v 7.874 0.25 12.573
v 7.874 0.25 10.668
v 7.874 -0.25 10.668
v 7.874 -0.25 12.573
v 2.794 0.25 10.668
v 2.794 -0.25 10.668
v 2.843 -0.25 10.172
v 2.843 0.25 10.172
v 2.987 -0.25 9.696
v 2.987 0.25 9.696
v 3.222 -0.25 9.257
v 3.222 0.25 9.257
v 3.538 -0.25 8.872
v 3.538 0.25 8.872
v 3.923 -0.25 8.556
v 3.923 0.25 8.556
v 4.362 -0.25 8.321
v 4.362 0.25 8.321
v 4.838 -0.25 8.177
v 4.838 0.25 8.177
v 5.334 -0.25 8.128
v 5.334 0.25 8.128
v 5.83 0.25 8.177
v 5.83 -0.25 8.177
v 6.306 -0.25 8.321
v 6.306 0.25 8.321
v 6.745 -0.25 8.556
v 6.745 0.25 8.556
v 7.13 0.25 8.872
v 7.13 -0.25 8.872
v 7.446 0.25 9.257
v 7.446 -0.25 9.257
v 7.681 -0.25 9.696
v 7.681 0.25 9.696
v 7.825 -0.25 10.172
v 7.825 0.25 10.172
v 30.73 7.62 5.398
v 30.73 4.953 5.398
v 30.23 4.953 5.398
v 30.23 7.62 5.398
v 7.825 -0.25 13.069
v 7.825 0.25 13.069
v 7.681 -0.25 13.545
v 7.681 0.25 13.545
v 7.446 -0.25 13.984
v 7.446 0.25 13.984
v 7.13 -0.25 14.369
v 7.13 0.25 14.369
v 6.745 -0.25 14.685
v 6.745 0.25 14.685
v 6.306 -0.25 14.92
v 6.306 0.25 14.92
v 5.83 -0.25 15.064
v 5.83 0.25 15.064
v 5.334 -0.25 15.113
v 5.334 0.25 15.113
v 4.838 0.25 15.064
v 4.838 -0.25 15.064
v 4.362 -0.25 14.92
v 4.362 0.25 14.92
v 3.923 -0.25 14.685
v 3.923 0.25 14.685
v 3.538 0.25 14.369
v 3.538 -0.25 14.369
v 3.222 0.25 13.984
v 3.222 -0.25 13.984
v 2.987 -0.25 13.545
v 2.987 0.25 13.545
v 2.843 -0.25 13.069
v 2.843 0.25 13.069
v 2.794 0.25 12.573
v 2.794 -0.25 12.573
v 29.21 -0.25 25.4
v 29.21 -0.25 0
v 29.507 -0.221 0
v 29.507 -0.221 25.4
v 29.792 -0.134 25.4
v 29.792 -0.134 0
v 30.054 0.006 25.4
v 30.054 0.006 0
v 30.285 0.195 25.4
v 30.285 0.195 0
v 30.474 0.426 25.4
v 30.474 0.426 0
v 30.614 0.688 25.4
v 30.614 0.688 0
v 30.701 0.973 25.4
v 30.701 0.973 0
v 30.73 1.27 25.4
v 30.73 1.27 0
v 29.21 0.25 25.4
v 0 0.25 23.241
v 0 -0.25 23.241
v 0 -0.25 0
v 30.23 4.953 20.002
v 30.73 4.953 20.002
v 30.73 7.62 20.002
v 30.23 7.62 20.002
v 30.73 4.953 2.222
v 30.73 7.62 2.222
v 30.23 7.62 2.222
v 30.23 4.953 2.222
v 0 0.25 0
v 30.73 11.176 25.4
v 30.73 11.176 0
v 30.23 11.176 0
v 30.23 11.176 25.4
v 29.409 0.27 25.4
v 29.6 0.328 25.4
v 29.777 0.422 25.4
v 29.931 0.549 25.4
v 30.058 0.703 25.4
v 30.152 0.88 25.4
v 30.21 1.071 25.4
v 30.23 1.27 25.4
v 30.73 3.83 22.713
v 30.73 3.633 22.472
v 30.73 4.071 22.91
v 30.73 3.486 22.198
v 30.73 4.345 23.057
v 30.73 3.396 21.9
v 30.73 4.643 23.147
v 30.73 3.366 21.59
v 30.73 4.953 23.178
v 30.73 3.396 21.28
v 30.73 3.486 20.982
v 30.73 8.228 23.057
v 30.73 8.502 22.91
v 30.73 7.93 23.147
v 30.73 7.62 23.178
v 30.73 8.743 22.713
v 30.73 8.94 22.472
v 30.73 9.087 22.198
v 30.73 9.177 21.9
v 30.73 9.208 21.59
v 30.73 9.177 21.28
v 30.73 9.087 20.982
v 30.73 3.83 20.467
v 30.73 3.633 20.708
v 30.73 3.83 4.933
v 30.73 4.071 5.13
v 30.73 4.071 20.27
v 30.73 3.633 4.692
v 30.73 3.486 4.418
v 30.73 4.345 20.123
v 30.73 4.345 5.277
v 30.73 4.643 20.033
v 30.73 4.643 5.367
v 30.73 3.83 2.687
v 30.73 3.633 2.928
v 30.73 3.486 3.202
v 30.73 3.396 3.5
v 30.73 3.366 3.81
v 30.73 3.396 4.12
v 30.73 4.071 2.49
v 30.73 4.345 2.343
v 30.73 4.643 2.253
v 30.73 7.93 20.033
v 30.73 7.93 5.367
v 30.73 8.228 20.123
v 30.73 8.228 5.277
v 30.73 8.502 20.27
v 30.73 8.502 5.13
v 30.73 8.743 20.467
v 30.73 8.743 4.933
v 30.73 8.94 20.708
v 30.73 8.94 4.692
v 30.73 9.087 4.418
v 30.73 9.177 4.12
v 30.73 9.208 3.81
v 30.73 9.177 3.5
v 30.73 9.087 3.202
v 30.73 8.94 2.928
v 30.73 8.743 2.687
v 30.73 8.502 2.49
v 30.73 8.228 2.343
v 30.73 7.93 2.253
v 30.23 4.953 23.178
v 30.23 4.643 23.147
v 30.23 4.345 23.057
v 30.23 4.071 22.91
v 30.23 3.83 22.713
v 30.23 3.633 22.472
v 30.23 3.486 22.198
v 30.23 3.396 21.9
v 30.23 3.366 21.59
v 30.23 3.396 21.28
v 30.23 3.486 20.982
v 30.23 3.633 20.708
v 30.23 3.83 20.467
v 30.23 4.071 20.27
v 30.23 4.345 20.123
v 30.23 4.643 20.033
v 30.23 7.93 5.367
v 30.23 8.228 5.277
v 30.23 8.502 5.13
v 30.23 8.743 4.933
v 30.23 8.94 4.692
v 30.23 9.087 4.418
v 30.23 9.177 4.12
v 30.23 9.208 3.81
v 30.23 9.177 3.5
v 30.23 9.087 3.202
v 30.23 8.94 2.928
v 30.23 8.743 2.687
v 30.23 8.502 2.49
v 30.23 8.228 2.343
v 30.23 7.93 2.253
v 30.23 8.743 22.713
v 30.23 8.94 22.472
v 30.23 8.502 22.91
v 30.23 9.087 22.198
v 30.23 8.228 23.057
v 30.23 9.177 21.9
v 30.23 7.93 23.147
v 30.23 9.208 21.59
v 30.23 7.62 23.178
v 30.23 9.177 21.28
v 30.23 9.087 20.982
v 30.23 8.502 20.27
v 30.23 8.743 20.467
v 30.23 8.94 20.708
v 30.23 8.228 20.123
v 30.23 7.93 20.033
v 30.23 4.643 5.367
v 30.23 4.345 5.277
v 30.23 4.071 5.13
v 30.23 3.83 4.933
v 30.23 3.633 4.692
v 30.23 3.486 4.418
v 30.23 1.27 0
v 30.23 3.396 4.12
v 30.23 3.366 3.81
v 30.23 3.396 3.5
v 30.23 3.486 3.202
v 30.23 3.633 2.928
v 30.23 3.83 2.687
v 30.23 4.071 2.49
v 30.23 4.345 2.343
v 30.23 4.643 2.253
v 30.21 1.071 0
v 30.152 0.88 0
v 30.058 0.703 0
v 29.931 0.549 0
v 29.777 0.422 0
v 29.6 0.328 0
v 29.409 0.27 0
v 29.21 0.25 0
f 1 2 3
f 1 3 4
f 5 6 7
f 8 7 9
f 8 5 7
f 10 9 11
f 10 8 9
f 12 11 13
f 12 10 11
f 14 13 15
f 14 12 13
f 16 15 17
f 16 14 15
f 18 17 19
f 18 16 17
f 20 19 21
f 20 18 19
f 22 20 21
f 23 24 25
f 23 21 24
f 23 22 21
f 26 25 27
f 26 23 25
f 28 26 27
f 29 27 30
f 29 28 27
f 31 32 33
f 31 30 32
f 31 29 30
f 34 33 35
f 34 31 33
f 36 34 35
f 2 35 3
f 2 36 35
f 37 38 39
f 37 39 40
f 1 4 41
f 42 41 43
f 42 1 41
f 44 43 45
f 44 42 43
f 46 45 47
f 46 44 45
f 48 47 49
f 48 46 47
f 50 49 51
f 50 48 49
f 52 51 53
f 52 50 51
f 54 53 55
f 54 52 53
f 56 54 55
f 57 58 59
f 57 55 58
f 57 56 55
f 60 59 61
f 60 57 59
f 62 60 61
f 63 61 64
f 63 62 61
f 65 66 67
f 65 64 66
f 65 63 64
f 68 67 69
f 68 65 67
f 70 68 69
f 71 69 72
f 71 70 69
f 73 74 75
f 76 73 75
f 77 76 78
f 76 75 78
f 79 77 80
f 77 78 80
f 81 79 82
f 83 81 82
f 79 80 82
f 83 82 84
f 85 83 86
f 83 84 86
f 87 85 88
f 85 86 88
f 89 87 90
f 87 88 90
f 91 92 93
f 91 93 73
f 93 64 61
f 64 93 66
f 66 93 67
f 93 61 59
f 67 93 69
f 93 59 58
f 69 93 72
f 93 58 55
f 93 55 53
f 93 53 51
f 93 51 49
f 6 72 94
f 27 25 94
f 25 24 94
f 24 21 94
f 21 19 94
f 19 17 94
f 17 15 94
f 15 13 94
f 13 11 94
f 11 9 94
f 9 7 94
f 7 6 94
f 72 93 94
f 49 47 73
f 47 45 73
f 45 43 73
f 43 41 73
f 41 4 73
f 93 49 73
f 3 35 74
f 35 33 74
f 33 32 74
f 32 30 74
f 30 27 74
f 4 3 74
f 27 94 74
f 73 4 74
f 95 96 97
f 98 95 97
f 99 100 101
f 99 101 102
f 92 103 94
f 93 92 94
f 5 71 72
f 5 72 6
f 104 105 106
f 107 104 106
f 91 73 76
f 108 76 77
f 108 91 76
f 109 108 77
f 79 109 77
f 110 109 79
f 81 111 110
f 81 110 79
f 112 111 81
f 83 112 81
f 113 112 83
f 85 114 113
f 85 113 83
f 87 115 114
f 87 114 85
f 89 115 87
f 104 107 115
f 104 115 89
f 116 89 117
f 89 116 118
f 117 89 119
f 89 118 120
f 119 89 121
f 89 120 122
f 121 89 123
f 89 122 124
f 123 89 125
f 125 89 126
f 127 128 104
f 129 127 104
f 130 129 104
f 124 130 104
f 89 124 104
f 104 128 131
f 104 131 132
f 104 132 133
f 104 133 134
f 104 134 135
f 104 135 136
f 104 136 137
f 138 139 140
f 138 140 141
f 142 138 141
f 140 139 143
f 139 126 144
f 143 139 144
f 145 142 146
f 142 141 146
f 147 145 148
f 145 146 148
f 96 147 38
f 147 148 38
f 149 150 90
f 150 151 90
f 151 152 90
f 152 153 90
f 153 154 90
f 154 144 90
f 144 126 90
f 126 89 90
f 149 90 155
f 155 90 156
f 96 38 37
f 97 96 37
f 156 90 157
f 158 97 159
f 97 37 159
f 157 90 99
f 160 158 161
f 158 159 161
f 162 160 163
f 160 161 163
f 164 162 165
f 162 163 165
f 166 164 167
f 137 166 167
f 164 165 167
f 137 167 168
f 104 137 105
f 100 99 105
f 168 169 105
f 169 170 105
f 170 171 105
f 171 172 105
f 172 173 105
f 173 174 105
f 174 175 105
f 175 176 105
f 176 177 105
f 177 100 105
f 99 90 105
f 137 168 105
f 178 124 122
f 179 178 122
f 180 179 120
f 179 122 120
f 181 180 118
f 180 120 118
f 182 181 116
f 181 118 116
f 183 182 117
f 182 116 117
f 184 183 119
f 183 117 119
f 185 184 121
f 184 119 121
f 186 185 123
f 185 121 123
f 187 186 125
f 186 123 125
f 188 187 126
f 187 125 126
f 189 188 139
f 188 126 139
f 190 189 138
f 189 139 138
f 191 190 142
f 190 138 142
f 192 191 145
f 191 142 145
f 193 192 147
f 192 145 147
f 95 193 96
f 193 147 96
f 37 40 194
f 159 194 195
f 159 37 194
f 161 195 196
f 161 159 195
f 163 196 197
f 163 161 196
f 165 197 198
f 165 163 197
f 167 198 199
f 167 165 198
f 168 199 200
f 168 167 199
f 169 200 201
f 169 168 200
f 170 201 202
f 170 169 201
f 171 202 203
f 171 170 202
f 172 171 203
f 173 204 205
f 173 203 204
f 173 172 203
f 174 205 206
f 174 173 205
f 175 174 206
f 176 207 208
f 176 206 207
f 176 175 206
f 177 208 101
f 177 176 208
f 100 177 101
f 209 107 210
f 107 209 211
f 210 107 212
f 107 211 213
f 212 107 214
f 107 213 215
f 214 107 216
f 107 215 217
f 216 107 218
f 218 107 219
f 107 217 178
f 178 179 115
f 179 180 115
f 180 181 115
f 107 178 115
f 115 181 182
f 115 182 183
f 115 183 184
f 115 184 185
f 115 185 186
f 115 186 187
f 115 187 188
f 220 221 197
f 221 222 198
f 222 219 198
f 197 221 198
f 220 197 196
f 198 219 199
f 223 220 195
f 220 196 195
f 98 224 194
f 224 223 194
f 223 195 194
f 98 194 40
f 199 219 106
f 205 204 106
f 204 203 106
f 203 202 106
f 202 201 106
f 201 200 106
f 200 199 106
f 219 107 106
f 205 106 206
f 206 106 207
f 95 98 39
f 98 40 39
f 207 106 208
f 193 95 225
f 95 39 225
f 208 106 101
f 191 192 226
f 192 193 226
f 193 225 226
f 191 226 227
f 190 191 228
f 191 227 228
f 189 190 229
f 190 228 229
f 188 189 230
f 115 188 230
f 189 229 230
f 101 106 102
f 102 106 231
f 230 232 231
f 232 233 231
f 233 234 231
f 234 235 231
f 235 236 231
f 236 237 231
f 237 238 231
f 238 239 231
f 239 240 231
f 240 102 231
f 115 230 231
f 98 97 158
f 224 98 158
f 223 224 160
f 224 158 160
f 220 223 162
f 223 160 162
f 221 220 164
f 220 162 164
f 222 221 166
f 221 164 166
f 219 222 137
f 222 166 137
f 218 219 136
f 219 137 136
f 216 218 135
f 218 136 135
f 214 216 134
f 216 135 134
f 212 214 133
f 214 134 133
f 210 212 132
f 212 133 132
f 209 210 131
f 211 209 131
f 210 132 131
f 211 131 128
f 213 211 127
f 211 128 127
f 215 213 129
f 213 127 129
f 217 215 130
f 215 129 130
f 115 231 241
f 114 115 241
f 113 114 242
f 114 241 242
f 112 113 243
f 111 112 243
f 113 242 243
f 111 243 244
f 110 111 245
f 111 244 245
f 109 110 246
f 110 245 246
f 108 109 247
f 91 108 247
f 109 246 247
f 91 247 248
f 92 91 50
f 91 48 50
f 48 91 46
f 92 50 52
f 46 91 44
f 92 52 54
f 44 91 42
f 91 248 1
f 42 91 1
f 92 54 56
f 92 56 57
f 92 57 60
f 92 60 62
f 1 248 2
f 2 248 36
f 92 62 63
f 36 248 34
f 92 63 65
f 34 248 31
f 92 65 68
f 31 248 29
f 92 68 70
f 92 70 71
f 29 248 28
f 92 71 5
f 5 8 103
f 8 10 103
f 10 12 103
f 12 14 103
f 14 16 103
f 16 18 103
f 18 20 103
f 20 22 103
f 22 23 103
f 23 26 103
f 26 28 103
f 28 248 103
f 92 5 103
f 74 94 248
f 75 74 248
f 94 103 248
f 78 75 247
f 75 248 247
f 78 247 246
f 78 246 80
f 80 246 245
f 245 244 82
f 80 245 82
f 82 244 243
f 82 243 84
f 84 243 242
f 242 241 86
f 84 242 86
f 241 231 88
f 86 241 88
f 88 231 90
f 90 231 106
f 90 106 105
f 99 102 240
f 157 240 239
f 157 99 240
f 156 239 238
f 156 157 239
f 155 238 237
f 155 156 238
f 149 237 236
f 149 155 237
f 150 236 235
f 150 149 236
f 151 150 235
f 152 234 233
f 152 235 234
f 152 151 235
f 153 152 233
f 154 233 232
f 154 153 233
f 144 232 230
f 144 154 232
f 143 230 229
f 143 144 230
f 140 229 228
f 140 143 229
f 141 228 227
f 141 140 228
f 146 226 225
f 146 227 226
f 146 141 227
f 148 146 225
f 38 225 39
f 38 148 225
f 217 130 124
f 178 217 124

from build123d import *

# Parameters (mm, degrees)
EXTRUDE_THIN1_DEPTH = 25.4
CUT_EXTRUDE1_DEPTH  = 42.405263868
CUT_EXTRUDE2_DEPTH  = 42.33848541


with BuildPart() as part:
    # Sketch3 → Extrude-Thin1 (new body)
    with BuildSketch(Plane.XY):
        with BuildLine():
            Line((0, -0.25), (29.21, -0.25))
            ThreePointArc((29.21, -0.25), (30.284802307, 0.195197693), (30.73, 1.27))
            Line((30.73, 1.27), (30.73, 11.176))
            Line((30.73, 11.176), (30.23, 11.176))
            Line((30.23, 11.176), (30.23, 1.27))
            ThreePointArc((30.23, 1.27), (29.931248917, 0.548751083), (29.21, 0.25))
            Line((29.21, 0.25), (0, 0.25))
            Line((0, 0.25), (0, -0.25))
        make_face()
    extrude(amount=EXTRUDE_THIN1_DEPTH)

    # Sketch4 → Cut-Extrude1 (cut, through all)
    with BuildSketch(Plane(origin=(30.73, 0, 0), x_dir=(0, 0, -1), z_dir=(1, 0, 0))):
        with BuildLine():
            Line((-5.3975, 4.953), (-5.3975, 7.62))
            ThreePointArc((-5.3975, 7.62), (-3.81, 9.2075), (-2.2225, 7.62))
            Line((-2.2225, 7.62), (-2.2225, 4.953))
            ThreePointArc((-2.2225, 4.953), (-3.81, 3.3655), (-5.3975, 4.953))
        make_face()
        with BuildLine():
            Line((-20.0025, 4.953), (-20.0025, 7.62))
            ThreePointArc((-20.0025, 7.62), (-21.59, 9.2075), (-23.1775, 7.62))
            Line((-23.1775, 7.62), (-23.1775, 4.953))
            ThreePointArc((-23.1775, 4.953), (-21.59, 3.3655), (-20.0025, 4.953))
        make_face()
    extrude(amount=-CUT_EXTRUDE1_DEPTH, mode=Mode.SUBTRACT)

    # Sketch5 → Cut-Extrude2 (cut, through all)
    with BuildSketch(Plane(origin=(0, 0.25, 0), x_dir=(1, 0, 0), z_dir=(0, 1, 0))):
        with BuildLine():
            Line((2.794, -12.573), (2.794, -10.668))
            ThreePointArc((2.794, -10.668), (5.334, -8.128), (7.874, -10.668))
            Line((7.874, -10.668), (7.874, -12.573))
            ThreePointArc((7.874, -12.573), (5.334, -15.113), (2.794, -12.573))
        make_face()
        Polygon((29.21, -25.4), (0, -25.4), (0, -23.241), align=None)
    extrude(amount=-CUT_EXTRUDE2_DEPTH, mode=Mode.SUBTRACT)


solid = part.part
